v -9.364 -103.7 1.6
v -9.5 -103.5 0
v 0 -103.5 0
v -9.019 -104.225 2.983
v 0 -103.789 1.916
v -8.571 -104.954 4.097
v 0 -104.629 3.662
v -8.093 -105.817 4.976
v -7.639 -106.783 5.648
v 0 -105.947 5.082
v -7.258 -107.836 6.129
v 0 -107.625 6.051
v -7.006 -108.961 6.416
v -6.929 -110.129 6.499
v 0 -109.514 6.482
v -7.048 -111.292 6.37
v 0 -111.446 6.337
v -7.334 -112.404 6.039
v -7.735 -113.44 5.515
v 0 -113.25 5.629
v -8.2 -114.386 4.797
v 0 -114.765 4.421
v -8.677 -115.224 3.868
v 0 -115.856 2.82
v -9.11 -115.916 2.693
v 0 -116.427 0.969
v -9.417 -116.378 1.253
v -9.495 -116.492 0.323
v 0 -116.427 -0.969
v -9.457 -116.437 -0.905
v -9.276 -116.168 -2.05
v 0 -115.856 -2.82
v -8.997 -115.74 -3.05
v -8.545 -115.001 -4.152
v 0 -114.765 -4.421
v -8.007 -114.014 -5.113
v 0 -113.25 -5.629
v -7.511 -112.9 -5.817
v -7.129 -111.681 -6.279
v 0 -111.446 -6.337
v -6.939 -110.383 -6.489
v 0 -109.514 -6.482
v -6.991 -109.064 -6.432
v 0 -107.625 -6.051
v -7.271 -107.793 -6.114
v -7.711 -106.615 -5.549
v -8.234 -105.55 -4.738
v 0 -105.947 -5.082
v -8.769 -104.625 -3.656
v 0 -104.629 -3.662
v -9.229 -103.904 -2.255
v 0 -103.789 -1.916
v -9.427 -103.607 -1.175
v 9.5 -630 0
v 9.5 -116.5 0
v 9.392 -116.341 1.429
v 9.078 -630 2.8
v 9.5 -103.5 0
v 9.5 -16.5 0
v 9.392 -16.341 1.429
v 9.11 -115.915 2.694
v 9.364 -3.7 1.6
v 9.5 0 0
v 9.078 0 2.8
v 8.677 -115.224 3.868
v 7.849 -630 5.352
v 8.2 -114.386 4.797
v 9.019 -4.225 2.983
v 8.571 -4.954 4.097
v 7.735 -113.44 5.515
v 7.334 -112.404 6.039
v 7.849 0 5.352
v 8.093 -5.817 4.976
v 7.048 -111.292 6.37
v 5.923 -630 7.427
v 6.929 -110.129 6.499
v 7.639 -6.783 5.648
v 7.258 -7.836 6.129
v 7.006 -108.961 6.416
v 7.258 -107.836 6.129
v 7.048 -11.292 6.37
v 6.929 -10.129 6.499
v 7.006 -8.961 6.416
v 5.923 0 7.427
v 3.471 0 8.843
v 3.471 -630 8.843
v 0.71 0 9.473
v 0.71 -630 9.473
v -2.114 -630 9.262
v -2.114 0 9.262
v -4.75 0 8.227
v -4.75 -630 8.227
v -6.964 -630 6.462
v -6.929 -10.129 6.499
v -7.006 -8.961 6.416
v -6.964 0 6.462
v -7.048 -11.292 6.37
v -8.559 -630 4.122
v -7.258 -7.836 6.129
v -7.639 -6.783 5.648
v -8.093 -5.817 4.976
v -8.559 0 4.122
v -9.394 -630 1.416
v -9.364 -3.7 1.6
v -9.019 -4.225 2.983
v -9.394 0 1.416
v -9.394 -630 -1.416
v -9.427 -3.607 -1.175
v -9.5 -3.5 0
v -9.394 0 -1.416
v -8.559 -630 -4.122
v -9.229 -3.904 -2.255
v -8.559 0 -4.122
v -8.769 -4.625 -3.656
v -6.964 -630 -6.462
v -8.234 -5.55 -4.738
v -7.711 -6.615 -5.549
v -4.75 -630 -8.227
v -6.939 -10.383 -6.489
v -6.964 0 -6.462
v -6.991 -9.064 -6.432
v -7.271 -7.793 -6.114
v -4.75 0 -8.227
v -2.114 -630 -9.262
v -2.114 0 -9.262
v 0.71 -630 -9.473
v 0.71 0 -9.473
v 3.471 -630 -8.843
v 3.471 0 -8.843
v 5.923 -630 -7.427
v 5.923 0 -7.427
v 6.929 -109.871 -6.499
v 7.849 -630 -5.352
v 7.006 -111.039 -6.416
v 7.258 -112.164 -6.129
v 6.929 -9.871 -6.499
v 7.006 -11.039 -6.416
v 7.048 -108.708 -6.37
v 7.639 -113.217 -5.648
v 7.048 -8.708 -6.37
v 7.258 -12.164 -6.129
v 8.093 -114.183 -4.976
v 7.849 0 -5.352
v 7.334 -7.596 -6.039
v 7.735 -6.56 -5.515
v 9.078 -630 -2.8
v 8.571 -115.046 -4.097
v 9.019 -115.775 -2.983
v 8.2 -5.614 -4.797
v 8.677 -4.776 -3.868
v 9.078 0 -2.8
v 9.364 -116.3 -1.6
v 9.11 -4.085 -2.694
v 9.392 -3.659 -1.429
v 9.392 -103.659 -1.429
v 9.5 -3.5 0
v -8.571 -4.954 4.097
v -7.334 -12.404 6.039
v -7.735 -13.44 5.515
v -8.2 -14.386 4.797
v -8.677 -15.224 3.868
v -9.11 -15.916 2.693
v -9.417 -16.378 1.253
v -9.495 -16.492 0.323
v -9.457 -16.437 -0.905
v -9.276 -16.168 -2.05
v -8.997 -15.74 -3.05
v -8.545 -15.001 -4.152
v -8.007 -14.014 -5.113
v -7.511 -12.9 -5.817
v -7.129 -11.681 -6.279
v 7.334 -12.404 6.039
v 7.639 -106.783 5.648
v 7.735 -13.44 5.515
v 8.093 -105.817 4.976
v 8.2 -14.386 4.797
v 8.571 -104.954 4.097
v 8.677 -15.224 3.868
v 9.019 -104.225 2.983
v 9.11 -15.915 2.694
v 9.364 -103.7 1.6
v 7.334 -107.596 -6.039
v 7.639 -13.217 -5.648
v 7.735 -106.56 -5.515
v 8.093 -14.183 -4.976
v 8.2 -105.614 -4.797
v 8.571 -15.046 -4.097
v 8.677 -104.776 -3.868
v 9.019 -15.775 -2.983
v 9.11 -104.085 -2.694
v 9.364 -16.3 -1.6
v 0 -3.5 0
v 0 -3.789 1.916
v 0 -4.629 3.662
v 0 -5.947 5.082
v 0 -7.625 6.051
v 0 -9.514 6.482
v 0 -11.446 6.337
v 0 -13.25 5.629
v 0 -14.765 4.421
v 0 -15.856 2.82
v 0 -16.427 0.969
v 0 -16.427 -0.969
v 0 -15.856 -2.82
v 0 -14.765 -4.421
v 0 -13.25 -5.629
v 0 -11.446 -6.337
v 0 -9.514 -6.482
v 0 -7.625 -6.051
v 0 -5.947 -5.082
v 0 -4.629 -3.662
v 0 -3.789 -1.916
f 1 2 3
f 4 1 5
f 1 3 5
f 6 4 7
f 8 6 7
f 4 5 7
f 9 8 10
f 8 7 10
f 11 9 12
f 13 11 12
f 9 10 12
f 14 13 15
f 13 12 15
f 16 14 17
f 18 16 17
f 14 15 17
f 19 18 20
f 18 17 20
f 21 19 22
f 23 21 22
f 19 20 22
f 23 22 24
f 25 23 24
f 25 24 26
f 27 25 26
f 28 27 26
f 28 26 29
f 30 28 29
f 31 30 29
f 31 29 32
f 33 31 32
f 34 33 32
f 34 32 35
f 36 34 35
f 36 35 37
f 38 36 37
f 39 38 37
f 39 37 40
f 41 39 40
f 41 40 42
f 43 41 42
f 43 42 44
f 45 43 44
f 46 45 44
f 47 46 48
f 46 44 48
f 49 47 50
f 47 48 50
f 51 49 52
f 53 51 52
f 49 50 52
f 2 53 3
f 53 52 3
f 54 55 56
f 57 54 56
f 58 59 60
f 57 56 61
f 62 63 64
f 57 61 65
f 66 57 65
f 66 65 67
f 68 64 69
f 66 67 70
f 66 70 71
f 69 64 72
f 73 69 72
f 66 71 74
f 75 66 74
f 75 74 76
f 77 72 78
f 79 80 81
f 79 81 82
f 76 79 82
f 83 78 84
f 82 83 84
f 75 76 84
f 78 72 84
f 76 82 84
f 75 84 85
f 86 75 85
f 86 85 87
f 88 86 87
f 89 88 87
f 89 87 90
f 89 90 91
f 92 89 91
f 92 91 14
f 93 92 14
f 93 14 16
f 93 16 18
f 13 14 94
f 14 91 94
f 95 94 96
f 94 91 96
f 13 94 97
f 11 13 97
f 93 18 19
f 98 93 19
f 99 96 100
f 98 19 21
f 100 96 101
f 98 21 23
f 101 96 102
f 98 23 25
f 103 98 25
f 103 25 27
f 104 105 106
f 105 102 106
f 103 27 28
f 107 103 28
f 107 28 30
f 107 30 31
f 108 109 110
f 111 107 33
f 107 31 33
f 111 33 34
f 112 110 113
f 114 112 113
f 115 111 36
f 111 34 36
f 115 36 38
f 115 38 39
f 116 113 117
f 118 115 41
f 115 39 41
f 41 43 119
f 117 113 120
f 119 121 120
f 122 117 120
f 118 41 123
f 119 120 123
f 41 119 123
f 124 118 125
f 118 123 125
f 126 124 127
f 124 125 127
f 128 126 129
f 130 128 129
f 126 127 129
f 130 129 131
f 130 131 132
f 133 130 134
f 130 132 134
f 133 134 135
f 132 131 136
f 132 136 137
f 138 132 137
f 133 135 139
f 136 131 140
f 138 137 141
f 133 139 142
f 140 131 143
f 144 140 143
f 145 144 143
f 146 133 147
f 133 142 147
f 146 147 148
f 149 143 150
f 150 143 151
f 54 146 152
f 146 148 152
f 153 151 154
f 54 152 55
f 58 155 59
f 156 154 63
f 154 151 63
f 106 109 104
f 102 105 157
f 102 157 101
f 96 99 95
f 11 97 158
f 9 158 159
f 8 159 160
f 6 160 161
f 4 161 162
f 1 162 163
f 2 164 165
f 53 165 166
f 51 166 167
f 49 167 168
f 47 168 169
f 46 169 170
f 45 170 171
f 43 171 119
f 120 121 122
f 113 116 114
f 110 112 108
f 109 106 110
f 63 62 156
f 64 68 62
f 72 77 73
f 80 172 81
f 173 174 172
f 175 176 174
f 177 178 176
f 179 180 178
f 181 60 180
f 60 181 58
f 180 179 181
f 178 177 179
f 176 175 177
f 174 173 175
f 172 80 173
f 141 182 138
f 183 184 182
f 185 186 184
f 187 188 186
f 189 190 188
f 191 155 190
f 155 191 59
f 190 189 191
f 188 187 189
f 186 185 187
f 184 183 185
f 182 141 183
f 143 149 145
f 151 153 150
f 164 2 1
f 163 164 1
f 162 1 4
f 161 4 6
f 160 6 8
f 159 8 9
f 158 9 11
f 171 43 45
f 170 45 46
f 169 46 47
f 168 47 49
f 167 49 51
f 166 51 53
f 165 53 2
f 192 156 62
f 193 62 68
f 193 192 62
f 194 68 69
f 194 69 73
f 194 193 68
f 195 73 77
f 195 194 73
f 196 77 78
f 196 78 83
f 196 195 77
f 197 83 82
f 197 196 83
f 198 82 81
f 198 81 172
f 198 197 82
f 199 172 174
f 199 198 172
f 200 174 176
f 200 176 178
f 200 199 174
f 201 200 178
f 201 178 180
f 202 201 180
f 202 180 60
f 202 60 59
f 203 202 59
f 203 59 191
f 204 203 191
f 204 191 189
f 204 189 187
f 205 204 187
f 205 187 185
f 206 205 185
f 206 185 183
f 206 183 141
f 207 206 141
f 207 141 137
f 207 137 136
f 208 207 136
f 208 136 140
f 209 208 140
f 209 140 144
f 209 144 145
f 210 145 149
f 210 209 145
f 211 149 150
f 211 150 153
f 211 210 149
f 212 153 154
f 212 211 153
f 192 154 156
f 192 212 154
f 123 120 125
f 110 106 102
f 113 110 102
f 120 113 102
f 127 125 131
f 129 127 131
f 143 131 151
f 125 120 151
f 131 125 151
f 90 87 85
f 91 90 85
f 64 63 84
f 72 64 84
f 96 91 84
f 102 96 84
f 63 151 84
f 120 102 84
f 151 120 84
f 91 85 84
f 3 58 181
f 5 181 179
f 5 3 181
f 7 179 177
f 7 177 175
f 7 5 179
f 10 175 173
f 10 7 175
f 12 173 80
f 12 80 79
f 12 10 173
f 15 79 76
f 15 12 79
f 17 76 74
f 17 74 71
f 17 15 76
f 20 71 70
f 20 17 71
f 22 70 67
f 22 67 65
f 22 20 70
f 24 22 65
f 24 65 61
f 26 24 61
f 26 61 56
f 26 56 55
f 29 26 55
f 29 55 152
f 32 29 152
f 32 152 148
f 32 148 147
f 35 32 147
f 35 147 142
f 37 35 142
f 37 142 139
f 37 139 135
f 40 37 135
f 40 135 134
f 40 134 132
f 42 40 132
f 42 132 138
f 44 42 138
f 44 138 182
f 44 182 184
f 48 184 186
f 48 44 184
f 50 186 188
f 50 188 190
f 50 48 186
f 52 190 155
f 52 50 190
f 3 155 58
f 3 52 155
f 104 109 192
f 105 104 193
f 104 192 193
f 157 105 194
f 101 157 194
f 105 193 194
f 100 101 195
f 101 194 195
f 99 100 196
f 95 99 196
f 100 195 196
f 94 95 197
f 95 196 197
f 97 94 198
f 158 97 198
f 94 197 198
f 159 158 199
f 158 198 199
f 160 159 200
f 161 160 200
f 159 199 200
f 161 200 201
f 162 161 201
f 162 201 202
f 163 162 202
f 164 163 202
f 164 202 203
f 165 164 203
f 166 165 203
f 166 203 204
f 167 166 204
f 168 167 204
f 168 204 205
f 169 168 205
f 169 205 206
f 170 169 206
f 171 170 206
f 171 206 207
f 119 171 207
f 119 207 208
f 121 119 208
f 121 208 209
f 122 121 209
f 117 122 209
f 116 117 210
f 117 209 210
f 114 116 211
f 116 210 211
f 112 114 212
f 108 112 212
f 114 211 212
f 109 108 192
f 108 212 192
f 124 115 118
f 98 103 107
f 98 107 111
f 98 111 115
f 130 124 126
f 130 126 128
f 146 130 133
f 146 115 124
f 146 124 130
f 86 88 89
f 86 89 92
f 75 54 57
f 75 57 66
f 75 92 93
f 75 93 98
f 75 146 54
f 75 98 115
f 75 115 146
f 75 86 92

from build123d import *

# Parameters (mm, degrees)
F0_R          = 9.5
F1_DEPTH      = 630
F2_R          = 6.5
F3_DEPTH      = 25
F3_DEPTH_BACK = 25


with BuildPart() as f1:
    # F0 (on Front) → F1 (new body)
    with BuildSketch(Plane.XZ):
        Circle(F0_R)
    extrude(amount=F1_DEPTH)

    # F2 (on Right) → F3 (cut, two sides)
    with BuildSketch(Plane.YZ) as f3_sk:
        with Locations((-10, 0)):
            Circle(F2_R)
        with Locations((-110, 0)):
            Circle(F2_R)
    extrude(amount=F3_DEPTH, mode=Mode.SUBTRACT)
    extrude(f3_sk.sketch, amount=-F3_DEPTH_BACK, mode=Mode.SUBTRACT)


solid = f1.part
